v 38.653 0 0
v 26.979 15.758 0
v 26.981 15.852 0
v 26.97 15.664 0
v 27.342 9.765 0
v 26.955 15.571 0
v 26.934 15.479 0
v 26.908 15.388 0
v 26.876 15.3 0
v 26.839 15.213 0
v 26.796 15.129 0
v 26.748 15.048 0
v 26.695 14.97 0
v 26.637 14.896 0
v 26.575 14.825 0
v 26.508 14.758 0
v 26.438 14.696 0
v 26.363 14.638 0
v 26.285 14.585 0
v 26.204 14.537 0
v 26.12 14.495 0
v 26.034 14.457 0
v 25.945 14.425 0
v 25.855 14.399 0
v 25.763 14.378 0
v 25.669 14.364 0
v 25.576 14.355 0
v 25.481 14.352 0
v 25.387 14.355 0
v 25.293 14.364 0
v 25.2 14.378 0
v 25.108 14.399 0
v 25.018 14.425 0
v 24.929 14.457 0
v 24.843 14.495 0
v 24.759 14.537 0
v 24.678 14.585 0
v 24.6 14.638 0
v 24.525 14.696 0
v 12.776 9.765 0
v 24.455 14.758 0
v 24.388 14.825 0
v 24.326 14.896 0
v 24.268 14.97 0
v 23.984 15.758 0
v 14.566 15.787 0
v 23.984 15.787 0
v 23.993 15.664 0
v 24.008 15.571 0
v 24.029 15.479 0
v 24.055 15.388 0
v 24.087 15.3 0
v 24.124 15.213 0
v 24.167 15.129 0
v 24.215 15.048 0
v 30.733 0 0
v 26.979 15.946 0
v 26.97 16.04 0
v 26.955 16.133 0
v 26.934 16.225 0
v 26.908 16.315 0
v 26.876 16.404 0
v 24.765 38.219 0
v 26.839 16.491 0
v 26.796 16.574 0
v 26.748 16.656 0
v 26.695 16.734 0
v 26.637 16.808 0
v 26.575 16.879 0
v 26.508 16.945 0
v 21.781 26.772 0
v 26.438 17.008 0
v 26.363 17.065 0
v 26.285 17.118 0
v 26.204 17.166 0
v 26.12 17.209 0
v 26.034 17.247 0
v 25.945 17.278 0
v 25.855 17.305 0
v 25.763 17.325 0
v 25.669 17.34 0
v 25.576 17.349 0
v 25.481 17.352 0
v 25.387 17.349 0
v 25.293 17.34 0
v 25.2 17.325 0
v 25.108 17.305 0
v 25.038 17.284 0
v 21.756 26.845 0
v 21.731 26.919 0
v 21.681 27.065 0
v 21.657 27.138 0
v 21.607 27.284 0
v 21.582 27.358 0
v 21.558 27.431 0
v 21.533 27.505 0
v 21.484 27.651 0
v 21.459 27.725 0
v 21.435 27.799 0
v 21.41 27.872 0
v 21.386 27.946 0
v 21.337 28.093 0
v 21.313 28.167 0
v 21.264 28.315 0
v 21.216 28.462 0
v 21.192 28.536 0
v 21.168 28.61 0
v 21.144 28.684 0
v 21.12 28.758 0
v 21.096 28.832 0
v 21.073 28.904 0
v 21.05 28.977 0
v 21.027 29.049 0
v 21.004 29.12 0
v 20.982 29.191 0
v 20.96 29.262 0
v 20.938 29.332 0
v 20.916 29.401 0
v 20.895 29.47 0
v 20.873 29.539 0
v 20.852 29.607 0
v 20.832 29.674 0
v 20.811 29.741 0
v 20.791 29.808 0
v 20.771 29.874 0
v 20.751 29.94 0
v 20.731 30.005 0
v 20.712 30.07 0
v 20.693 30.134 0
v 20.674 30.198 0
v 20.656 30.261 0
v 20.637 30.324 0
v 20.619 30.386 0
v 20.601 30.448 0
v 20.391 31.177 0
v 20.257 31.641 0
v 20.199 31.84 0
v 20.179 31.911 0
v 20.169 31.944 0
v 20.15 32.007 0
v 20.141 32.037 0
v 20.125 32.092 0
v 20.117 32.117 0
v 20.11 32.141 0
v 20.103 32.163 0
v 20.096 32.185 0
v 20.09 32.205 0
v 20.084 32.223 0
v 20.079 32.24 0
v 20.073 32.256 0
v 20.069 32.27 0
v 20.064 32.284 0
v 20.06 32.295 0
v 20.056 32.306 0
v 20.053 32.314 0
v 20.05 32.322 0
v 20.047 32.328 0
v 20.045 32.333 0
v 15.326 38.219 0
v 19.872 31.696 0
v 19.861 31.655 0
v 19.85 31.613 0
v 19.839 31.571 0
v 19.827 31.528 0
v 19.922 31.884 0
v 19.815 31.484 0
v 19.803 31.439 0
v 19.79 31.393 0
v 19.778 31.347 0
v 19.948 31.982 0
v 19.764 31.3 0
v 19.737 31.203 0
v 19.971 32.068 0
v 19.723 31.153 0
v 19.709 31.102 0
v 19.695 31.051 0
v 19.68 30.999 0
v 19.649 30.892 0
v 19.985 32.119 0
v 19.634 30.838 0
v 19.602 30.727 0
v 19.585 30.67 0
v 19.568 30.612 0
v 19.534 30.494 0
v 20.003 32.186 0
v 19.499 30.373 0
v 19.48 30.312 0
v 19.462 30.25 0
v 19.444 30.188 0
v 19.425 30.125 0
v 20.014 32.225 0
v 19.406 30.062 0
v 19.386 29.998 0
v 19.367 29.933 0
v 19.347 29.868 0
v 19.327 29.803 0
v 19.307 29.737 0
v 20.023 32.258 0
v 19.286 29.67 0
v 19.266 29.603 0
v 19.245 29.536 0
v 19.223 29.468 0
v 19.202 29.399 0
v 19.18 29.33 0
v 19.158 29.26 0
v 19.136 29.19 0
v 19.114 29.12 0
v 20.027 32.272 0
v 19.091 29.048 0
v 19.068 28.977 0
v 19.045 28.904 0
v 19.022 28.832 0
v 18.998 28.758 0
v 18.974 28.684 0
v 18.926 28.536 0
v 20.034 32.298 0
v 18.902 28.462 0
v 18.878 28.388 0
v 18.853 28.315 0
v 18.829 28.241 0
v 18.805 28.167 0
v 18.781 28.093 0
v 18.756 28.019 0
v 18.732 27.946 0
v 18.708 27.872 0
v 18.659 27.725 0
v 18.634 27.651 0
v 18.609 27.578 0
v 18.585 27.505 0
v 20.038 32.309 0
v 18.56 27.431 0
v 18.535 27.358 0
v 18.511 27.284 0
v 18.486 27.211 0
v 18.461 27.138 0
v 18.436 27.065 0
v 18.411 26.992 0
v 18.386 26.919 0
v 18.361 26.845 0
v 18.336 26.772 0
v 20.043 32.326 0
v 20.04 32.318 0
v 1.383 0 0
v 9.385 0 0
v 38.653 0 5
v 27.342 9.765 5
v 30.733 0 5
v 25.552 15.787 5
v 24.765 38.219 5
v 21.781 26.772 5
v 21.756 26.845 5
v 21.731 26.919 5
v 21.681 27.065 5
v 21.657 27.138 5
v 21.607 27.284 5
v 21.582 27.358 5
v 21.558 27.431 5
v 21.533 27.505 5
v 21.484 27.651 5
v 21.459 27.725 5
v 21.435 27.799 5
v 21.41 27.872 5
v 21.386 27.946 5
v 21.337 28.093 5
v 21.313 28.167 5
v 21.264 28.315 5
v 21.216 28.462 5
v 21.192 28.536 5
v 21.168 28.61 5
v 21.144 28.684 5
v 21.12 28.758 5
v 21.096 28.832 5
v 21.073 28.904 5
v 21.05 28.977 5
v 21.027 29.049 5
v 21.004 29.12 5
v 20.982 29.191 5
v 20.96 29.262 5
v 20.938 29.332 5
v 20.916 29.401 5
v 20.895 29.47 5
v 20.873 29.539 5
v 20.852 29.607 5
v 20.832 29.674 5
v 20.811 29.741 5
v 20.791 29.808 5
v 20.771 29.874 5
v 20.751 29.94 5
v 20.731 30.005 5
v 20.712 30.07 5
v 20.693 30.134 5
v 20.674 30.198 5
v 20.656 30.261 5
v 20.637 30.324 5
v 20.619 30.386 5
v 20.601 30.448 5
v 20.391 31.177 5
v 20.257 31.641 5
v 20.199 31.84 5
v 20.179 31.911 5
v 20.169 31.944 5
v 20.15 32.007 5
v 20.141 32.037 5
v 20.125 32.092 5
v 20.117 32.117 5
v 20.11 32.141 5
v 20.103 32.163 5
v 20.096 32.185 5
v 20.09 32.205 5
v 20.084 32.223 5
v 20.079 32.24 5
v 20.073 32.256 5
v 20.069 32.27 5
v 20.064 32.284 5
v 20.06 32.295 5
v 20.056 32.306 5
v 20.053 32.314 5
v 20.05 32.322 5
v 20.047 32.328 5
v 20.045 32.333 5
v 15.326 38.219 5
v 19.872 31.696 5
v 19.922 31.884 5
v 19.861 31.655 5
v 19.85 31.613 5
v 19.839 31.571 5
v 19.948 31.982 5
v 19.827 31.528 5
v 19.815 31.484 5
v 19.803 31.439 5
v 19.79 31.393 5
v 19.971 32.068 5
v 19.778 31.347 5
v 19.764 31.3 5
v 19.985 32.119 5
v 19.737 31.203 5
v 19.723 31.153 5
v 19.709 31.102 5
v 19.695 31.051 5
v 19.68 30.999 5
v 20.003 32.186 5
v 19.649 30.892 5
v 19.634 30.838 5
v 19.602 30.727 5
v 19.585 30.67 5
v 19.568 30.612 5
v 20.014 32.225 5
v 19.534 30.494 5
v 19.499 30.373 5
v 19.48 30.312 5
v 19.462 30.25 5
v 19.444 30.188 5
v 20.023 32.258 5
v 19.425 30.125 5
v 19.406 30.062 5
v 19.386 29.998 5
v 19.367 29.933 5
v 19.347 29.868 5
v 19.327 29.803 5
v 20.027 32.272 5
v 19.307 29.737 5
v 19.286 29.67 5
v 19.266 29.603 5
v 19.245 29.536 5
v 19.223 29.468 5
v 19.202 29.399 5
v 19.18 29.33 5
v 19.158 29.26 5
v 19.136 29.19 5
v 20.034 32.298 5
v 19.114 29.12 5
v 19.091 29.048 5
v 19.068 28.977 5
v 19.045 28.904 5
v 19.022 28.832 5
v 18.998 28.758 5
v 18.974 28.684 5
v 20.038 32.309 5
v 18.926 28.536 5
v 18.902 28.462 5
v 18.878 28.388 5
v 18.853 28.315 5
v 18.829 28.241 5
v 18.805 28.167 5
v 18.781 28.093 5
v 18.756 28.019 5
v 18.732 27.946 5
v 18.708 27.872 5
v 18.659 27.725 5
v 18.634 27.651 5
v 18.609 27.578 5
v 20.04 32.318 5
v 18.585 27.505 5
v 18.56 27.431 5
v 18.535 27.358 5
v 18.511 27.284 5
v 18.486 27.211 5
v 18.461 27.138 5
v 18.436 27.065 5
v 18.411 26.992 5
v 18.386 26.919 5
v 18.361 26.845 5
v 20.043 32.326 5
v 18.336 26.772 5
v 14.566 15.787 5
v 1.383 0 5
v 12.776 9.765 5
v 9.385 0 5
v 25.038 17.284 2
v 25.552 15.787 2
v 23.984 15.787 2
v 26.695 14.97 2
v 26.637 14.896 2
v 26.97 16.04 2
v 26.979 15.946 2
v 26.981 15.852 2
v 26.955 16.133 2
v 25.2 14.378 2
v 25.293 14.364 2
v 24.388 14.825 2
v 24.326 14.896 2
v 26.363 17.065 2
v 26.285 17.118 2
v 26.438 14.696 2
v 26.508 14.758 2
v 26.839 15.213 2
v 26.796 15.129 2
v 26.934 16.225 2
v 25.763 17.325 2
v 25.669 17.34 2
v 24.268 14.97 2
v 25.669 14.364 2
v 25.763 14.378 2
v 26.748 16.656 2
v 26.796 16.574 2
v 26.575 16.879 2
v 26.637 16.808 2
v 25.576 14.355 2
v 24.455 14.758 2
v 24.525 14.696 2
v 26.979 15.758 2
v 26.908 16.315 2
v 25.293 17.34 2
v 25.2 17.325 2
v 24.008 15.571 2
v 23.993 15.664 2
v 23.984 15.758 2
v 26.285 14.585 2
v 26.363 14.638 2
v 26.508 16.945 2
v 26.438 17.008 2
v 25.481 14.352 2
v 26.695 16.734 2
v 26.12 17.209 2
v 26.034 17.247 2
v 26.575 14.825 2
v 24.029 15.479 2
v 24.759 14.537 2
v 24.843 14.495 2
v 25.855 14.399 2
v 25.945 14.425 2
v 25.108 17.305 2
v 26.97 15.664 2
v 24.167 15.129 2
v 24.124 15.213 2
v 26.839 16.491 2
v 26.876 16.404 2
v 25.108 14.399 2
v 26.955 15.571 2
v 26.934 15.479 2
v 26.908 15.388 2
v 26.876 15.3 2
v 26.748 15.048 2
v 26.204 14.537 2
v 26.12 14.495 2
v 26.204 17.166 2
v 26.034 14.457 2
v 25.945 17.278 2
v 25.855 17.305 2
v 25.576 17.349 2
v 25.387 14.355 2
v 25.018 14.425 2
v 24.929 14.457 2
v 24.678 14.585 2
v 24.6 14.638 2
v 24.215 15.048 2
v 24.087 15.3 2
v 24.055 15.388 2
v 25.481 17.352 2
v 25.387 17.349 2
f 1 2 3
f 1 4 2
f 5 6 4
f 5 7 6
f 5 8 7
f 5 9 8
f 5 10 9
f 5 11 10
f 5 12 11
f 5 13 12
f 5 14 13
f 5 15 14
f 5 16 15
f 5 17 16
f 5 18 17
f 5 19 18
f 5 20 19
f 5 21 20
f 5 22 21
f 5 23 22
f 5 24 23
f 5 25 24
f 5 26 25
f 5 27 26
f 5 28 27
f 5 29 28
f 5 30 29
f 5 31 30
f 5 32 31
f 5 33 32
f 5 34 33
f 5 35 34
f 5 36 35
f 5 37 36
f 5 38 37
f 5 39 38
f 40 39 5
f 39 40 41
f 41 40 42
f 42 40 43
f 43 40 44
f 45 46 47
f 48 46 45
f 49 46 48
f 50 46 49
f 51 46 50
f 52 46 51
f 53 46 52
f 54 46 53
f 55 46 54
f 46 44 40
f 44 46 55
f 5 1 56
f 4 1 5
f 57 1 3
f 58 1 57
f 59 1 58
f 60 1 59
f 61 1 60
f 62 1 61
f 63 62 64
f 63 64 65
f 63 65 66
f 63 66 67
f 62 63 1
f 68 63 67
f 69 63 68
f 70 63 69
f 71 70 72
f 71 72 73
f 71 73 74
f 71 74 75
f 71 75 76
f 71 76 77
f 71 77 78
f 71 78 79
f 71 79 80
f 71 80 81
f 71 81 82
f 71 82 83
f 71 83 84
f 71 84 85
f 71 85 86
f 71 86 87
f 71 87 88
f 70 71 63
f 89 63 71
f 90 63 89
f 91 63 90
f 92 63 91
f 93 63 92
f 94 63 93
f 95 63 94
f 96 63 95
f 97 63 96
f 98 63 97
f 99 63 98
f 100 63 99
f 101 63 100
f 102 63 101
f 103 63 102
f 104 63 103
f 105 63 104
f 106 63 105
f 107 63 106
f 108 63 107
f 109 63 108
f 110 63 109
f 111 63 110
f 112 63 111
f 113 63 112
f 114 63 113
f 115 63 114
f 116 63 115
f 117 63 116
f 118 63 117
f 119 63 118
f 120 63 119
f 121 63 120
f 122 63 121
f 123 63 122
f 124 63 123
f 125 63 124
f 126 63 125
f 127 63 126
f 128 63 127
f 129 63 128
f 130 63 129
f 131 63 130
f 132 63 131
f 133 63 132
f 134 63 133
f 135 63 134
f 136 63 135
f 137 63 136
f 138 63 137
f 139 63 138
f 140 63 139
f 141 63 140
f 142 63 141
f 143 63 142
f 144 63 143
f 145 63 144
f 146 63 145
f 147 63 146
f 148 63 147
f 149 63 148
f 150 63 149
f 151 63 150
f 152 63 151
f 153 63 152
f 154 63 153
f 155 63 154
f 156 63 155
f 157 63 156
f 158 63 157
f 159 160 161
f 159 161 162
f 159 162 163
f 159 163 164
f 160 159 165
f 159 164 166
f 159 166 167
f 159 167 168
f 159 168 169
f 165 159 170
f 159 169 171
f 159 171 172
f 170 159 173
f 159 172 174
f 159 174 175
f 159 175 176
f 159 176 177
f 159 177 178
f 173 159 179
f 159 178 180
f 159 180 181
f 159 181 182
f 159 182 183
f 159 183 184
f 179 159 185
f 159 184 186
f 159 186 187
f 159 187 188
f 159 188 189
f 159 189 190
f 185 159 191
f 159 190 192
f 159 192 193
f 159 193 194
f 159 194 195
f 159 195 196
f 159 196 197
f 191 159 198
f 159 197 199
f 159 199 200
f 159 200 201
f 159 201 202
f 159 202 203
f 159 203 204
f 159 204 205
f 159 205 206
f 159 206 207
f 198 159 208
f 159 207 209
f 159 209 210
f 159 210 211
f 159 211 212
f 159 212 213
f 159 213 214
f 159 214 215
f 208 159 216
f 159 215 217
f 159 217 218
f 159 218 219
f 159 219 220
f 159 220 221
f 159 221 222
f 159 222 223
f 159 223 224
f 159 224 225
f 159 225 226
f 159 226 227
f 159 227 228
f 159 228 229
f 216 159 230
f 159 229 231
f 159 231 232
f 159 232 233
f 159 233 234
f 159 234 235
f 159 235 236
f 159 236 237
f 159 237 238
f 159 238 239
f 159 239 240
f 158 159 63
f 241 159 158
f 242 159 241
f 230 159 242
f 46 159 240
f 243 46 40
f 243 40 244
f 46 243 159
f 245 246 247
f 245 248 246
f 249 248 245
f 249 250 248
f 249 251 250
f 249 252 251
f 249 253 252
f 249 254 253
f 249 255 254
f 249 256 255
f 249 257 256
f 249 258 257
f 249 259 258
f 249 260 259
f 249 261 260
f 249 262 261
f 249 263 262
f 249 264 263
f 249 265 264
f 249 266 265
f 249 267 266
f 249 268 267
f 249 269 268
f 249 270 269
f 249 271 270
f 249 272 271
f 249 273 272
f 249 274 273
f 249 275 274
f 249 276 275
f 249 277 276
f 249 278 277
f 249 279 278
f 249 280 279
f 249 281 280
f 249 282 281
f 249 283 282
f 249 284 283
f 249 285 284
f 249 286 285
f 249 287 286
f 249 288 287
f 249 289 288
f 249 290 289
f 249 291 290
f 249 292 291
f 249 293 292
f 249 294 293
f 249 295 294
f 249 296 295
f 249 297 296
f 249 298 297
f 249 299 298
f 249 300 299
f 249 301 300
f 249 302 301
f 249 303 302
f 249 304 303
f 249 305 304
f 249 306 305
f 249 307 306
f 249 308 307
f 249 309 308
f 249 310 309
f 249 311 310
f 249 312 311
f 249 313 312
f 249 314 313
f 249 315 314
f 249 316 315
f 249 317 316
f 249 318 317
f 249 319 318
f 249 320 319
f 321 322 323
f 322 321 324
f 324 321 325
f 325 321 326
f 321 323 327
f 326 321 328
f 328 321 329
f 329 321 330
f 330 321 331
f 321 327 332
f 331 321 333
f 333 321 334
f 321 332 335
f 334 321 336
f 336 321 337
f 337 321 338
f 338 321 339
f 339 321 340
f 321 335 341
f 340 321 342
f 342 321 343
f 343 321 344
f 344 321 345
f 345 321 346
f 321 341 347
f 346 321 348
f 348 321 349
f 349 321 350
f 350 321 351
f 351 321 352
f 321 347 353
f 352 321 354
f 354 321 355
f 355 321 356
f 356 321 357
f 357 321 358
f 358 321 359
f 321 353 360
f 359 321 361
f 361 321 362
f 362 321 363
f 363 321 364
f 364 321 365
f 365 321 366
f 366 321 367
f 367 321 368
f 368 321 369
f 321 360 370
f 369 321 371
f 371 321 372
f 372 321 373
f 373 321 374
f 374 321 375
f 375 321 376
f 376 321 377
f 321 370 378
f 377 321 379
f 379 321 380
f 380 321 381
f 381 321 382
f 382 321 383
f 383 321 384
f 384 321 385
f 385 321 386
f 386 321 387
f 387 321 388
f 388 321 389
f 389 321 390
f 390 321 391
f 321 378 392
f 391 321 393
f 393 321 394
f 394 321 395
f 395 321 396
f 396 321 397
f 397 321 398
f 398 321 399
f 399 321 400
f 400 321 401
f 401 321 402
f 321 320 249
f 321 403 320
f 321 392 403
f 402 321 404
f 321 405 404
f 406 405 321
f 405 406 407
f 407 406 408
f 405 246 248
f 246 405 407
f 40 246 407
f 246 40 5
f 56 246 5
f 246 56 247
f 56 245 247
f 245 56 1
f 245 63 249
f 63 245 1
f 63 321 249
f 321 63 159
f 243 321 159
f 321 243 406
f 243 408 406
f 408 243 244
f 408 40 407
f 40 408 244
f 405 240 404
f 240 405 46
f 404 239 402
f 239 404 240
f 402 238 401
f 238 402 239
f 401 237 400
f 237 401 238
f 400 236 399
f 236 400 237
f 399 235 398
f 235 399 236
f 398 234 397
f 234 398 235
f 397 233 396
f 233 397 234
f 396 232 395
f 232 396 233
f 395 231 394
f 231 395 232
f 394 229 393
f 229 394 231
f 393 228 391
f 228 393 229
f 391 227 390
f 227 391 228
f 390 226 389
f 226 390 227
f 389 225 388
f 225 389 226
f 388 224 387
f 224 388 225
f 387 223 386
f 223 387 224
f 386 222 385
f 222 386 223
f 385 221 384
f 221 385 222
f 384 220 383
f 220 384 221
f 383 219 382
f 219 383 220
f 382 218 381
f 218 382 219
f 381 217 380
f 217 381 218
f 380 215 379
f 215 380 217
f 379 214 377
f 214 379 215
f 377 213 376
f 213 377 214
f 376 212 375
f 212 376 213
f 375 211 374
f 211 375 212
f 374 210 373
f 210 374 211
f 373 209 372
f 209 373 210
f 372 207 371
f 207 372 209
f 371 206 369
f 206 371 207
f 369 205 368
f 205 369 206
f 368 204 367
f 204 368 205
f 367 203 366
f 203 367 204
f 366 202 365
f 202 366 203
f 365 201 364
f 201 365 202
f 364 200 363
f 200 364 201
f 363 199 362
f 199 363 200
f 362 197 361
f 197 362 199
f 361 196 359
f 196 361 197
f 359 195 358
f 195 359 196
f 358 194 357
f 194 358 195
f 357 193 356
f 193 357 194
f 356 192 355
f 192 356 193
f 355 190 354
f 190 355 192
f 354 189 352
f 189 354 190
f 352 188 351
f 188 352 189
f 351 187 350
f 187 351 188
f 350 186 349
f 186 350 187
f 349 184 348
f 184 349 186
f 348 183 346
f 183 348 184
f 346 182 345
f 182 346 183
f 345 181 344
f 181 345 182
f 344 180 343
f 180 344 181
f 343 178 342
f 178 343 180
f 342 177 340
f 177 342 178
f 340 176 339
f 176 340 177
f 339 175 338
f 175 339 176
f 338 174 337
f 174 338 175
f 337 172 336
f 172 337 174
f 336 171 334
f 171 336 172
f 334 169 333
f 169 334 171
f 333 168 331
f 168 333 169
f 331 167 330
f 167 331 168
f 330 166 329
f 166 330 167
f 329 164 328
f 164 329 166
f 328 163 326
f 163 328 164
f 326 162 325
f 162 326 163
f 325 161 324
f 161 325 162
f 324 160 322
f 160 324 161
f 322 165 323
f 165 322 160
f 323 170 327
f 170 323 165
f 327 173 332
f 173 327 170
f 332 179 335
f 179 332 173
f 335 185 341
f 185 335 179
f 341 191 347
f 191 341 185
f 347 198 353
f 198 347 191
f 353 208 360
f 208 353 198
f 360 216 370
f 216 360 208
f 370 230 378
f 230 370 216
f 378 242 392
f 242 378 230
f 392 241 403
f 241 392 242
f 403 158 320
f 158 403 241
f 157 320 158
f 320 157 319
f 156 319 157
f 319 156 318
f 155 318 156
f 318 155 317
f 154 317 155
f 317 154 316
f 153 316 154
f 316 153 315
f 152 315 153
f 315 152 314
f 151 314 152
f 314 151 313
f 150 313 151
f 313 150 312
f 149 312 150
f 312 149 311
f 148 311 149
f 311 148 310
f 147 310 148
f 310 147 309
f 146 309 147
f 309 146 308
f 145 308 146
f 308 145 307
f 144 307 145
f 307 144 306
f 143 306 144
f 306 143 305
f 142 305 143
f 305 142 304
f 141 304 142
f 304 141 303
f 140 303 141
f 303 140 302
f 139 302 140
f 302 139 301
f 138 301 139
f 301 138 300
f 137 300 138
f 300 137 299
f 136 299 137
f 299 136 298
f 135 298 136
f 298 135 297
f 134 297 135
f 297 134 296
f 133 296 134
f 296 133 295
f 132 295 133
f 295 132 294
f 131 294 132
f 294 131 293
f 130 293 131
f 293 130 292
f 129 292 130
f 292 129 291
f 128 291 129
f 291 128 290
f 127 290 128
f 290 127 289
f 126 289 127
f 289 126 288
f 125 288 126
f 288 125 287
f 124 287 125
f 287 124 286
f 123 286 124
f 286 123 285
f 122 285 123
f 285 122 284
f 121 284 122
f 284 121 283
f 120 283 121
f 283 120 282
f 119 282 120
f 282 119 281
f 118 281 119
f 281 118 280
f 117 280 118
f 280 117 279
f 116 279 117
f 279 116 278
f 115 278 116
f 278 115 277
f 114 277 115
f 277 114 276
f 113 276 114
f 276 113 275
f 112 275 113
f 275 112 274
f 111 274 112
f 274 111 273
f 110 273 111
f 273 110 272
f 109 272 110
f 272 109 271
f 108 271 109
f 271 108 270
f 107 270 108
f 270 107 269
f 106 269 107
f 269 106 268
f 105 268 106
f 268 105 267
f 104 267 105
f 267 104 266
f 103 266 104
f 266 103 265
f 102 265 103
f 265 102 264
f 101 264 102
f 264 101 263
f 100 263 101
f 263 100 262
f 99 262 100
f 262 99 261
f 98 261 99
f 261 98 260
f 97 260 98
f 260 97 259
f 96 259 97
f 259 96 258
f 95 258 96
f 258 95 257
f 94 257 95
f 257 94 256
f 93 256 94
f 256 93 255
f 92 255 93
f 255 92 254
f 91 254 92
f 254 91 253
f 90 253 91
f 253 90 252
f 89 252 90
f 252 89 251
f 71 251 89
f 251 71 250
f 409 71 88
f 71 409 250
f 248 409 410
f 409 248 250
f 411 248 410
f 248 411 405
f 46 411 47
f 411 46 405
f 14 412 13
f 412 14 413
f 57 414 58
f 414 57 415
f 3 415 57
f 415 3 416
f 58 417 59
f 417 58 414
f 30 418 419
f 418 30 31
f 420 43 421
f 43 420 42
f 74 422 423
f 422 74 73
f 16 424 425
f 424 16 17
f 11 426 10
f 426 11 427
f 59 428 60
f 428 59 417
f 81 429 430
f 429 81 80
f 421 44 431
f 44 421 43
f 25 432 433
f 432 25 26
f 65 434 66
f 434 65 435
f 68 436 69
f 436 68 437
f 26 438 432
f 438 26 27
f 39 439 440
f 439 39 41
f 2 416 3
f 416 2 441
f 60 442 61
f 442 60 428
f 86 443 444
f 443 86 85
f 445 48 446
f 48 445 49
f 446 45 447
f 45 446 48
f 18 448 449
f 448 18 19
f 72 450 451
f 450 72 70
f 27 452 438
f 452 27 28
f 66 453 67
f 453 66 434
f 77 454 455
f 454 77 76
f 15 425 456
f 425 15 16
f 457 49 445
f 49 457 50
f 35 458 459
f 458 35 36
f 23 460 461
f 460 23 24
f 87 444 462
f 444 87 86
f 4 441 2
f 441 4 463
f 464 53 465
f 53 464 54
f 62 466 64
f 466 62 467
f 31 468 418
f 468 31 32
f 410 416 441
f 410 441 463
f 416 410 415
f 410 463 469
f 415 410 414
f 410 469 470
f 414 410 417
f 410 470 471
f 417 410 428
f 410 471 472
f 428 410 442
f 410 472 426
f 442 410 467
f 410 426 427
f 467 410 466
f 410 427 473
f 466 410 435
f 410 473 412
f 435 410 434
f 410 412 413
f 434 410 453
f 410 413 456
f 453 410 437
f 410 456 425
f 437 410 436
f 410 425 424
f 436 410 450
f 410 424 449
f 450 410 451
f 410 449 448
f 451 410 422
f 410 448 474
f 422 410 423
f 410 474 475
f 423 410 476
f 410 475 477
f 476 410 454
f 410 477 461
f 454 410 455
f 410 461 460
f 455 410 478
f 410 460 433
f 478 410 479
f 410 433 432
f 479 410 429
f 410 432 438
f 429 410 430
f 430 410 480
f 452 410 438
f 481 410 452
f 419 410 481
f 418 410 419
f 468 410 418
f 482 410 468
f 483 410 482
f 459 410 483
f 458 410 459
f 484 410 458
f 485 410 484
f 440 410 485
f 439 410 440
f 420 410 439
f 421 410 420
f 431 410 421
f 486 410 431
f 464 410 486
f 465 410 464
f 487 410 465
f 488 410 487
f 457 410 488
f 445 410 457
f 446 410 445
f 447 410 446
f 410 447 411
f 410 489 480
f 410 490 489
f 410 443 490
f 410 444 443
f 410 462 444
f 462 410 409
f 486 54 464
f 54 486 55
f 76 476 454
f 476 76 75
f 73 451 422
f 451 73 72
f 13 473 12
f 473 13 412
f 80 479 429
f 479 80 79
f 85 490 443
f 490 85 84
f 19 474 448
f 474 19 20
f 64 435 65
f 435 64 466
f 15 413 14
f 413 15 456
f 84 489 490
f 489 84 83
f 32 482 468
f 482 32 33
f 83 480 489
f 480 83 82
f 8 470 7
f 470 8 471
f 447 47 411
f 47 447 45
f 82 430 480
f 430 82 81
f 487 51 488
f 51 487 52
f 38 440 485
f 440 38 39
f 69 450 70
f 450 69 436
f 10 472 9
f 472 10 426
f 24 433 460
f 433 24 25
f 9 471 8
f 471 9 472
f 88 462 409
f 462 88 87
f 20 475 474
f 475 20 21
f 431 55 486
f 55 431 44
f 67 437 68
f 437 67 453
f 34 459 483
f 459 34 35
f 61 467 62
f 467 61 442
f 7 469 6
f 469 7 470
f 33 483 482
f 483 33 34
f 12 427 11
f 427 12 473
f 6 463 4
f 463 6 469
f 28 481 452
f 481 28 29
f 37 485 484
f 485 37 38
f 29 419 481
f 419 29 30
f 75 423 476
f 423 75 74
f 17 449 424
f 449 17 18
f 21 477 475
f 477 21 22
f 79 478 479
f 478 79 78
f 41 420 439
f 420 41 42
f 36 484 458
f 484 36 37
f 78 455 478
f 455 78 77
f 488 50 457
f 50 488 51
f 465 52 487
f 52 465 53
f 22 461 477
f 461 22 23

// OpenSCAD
// file: charsAndPos.scad
charactersAndPos=
[
  [
    "A",
    [
      25.481481481481477,
      15.851851851851851
    ]
  ],
  [
    "B",
    [
      11.703703703703706,
      5.925925925925928
    ]
  ],
  [
    "C",
    [
      31.703703703703706,
      12.962962962962965
    ]
  ],
  [
    "D",
    [
      11.703703703703706,
      6.1481481481481515
    ]
  ],
  [
    "E",
    [
      11.703703703703706,
      6.1481481481481515
    ]
  ],
  [
    "F",
    [
      11.777777777777779,
      13.925925925925927
    ]
  ],
  [
    "G",
    [
      32.51851851851852,
      14.296296296296298
    ]
  ],
  [
    "H",
    [
      28.444444444444443,
      16.37037037037037
    ]
  ],
  [
    "I",
    [
      11.555555555555557,
      38.37037037037037
    ]
  ],
  [
    "J",
    [
      19.11111111111111,
      31.925925925925924
    ]
  ],
  [
    "K",
    [
      11.62962962962963,
      20.962962962962962
    ]
  ],
  [
    "L",
    [
      11.703703703703706,
      6.074074074074077
    ]
  ],
  [
    "M",
    [
      23.11111111111111,
      9.703703703703706
    ]
  ],
  [
    "N",
    [
      29.629629629629633,
      8.666666666666664
    ]
  ],
  [
    "O",
    [
      21.555555555555557,
      32.74074074074075
    ]
  ],
  [
    "P",
    [
      11.703703703703706,
      19.62962962962963
    ]
  ],
  [
    "Q",
    [
      26.5925925925926,
      2.6645352591003757e-15
    ]
  ],
  [
    "R",
    [
      11.62962962962963,
      14.518518518518523
    ]
  ],
  [
    "S",
    [
      11.111111111111112,
      28.59259259259259
    ]
  ],
  [
    "T",
    [
      12.88888888888889,
      32.074074074074076
    ]
  ],
  [
    "U",
    [
      19.703703703703702,
      5.555555555555556
    ]
  ],
  [
    "V",
    [
      18.51851851851852,
      6.370370370370369
    ]
  ],
  [
    "W",
    [
      26.2962962962963,
      30.22222222222223
    ]
  ],
  [
    "X",
    [
      18.51851851851852,
      24.666666666666664
    ]
  ],
  [
    "Y",
    [
      18.51851851851852,
      21.925925925925924
    ]
  ],
  [
    "Z",
    [
      22.296296296296298,
      32
    ]
  ]
];
// main file
include <charsAndPos.scad>;

charId = 0;
mDia = 3;
mH = 3;
mSides = 100;
fontName = "Arial";
echo("fontName: ", str(fontName,":style=Bold"));

generateChar(
    char = charactersAndPos[charId][0],
    fontSize = 40,
    font = str(fontName,":style=Bold"),
    charThickness =  2,
    magnetOffset = charactersAndPos[charId][1],
    magnetDiagonal = mDia,
    magnetHeight = mH,
    magnetSides = mSides
);



module generateChar(
    char = "A",
    fontSize = 10,
    font = "Arial",
    charThickness = 10,
    magnetOffset = [0, 0],
    magnetDiagonal = 3,
    magnetHeight = 3,
    magnetSides=4
){
        difference() {
            linear_extrude(height = charThickness+magnetHeight){
                text(text = char, size = fontSize, font = font, $fn=200);
            }
            color("red") 
            translate([magnetOffset[0], magnetOffset[1],charThickness - magnetHeight/2])
            cylinder(d = magnetDiagonal, h=magnetHeight, center=true, $fn=magnetSides);
        }
}
